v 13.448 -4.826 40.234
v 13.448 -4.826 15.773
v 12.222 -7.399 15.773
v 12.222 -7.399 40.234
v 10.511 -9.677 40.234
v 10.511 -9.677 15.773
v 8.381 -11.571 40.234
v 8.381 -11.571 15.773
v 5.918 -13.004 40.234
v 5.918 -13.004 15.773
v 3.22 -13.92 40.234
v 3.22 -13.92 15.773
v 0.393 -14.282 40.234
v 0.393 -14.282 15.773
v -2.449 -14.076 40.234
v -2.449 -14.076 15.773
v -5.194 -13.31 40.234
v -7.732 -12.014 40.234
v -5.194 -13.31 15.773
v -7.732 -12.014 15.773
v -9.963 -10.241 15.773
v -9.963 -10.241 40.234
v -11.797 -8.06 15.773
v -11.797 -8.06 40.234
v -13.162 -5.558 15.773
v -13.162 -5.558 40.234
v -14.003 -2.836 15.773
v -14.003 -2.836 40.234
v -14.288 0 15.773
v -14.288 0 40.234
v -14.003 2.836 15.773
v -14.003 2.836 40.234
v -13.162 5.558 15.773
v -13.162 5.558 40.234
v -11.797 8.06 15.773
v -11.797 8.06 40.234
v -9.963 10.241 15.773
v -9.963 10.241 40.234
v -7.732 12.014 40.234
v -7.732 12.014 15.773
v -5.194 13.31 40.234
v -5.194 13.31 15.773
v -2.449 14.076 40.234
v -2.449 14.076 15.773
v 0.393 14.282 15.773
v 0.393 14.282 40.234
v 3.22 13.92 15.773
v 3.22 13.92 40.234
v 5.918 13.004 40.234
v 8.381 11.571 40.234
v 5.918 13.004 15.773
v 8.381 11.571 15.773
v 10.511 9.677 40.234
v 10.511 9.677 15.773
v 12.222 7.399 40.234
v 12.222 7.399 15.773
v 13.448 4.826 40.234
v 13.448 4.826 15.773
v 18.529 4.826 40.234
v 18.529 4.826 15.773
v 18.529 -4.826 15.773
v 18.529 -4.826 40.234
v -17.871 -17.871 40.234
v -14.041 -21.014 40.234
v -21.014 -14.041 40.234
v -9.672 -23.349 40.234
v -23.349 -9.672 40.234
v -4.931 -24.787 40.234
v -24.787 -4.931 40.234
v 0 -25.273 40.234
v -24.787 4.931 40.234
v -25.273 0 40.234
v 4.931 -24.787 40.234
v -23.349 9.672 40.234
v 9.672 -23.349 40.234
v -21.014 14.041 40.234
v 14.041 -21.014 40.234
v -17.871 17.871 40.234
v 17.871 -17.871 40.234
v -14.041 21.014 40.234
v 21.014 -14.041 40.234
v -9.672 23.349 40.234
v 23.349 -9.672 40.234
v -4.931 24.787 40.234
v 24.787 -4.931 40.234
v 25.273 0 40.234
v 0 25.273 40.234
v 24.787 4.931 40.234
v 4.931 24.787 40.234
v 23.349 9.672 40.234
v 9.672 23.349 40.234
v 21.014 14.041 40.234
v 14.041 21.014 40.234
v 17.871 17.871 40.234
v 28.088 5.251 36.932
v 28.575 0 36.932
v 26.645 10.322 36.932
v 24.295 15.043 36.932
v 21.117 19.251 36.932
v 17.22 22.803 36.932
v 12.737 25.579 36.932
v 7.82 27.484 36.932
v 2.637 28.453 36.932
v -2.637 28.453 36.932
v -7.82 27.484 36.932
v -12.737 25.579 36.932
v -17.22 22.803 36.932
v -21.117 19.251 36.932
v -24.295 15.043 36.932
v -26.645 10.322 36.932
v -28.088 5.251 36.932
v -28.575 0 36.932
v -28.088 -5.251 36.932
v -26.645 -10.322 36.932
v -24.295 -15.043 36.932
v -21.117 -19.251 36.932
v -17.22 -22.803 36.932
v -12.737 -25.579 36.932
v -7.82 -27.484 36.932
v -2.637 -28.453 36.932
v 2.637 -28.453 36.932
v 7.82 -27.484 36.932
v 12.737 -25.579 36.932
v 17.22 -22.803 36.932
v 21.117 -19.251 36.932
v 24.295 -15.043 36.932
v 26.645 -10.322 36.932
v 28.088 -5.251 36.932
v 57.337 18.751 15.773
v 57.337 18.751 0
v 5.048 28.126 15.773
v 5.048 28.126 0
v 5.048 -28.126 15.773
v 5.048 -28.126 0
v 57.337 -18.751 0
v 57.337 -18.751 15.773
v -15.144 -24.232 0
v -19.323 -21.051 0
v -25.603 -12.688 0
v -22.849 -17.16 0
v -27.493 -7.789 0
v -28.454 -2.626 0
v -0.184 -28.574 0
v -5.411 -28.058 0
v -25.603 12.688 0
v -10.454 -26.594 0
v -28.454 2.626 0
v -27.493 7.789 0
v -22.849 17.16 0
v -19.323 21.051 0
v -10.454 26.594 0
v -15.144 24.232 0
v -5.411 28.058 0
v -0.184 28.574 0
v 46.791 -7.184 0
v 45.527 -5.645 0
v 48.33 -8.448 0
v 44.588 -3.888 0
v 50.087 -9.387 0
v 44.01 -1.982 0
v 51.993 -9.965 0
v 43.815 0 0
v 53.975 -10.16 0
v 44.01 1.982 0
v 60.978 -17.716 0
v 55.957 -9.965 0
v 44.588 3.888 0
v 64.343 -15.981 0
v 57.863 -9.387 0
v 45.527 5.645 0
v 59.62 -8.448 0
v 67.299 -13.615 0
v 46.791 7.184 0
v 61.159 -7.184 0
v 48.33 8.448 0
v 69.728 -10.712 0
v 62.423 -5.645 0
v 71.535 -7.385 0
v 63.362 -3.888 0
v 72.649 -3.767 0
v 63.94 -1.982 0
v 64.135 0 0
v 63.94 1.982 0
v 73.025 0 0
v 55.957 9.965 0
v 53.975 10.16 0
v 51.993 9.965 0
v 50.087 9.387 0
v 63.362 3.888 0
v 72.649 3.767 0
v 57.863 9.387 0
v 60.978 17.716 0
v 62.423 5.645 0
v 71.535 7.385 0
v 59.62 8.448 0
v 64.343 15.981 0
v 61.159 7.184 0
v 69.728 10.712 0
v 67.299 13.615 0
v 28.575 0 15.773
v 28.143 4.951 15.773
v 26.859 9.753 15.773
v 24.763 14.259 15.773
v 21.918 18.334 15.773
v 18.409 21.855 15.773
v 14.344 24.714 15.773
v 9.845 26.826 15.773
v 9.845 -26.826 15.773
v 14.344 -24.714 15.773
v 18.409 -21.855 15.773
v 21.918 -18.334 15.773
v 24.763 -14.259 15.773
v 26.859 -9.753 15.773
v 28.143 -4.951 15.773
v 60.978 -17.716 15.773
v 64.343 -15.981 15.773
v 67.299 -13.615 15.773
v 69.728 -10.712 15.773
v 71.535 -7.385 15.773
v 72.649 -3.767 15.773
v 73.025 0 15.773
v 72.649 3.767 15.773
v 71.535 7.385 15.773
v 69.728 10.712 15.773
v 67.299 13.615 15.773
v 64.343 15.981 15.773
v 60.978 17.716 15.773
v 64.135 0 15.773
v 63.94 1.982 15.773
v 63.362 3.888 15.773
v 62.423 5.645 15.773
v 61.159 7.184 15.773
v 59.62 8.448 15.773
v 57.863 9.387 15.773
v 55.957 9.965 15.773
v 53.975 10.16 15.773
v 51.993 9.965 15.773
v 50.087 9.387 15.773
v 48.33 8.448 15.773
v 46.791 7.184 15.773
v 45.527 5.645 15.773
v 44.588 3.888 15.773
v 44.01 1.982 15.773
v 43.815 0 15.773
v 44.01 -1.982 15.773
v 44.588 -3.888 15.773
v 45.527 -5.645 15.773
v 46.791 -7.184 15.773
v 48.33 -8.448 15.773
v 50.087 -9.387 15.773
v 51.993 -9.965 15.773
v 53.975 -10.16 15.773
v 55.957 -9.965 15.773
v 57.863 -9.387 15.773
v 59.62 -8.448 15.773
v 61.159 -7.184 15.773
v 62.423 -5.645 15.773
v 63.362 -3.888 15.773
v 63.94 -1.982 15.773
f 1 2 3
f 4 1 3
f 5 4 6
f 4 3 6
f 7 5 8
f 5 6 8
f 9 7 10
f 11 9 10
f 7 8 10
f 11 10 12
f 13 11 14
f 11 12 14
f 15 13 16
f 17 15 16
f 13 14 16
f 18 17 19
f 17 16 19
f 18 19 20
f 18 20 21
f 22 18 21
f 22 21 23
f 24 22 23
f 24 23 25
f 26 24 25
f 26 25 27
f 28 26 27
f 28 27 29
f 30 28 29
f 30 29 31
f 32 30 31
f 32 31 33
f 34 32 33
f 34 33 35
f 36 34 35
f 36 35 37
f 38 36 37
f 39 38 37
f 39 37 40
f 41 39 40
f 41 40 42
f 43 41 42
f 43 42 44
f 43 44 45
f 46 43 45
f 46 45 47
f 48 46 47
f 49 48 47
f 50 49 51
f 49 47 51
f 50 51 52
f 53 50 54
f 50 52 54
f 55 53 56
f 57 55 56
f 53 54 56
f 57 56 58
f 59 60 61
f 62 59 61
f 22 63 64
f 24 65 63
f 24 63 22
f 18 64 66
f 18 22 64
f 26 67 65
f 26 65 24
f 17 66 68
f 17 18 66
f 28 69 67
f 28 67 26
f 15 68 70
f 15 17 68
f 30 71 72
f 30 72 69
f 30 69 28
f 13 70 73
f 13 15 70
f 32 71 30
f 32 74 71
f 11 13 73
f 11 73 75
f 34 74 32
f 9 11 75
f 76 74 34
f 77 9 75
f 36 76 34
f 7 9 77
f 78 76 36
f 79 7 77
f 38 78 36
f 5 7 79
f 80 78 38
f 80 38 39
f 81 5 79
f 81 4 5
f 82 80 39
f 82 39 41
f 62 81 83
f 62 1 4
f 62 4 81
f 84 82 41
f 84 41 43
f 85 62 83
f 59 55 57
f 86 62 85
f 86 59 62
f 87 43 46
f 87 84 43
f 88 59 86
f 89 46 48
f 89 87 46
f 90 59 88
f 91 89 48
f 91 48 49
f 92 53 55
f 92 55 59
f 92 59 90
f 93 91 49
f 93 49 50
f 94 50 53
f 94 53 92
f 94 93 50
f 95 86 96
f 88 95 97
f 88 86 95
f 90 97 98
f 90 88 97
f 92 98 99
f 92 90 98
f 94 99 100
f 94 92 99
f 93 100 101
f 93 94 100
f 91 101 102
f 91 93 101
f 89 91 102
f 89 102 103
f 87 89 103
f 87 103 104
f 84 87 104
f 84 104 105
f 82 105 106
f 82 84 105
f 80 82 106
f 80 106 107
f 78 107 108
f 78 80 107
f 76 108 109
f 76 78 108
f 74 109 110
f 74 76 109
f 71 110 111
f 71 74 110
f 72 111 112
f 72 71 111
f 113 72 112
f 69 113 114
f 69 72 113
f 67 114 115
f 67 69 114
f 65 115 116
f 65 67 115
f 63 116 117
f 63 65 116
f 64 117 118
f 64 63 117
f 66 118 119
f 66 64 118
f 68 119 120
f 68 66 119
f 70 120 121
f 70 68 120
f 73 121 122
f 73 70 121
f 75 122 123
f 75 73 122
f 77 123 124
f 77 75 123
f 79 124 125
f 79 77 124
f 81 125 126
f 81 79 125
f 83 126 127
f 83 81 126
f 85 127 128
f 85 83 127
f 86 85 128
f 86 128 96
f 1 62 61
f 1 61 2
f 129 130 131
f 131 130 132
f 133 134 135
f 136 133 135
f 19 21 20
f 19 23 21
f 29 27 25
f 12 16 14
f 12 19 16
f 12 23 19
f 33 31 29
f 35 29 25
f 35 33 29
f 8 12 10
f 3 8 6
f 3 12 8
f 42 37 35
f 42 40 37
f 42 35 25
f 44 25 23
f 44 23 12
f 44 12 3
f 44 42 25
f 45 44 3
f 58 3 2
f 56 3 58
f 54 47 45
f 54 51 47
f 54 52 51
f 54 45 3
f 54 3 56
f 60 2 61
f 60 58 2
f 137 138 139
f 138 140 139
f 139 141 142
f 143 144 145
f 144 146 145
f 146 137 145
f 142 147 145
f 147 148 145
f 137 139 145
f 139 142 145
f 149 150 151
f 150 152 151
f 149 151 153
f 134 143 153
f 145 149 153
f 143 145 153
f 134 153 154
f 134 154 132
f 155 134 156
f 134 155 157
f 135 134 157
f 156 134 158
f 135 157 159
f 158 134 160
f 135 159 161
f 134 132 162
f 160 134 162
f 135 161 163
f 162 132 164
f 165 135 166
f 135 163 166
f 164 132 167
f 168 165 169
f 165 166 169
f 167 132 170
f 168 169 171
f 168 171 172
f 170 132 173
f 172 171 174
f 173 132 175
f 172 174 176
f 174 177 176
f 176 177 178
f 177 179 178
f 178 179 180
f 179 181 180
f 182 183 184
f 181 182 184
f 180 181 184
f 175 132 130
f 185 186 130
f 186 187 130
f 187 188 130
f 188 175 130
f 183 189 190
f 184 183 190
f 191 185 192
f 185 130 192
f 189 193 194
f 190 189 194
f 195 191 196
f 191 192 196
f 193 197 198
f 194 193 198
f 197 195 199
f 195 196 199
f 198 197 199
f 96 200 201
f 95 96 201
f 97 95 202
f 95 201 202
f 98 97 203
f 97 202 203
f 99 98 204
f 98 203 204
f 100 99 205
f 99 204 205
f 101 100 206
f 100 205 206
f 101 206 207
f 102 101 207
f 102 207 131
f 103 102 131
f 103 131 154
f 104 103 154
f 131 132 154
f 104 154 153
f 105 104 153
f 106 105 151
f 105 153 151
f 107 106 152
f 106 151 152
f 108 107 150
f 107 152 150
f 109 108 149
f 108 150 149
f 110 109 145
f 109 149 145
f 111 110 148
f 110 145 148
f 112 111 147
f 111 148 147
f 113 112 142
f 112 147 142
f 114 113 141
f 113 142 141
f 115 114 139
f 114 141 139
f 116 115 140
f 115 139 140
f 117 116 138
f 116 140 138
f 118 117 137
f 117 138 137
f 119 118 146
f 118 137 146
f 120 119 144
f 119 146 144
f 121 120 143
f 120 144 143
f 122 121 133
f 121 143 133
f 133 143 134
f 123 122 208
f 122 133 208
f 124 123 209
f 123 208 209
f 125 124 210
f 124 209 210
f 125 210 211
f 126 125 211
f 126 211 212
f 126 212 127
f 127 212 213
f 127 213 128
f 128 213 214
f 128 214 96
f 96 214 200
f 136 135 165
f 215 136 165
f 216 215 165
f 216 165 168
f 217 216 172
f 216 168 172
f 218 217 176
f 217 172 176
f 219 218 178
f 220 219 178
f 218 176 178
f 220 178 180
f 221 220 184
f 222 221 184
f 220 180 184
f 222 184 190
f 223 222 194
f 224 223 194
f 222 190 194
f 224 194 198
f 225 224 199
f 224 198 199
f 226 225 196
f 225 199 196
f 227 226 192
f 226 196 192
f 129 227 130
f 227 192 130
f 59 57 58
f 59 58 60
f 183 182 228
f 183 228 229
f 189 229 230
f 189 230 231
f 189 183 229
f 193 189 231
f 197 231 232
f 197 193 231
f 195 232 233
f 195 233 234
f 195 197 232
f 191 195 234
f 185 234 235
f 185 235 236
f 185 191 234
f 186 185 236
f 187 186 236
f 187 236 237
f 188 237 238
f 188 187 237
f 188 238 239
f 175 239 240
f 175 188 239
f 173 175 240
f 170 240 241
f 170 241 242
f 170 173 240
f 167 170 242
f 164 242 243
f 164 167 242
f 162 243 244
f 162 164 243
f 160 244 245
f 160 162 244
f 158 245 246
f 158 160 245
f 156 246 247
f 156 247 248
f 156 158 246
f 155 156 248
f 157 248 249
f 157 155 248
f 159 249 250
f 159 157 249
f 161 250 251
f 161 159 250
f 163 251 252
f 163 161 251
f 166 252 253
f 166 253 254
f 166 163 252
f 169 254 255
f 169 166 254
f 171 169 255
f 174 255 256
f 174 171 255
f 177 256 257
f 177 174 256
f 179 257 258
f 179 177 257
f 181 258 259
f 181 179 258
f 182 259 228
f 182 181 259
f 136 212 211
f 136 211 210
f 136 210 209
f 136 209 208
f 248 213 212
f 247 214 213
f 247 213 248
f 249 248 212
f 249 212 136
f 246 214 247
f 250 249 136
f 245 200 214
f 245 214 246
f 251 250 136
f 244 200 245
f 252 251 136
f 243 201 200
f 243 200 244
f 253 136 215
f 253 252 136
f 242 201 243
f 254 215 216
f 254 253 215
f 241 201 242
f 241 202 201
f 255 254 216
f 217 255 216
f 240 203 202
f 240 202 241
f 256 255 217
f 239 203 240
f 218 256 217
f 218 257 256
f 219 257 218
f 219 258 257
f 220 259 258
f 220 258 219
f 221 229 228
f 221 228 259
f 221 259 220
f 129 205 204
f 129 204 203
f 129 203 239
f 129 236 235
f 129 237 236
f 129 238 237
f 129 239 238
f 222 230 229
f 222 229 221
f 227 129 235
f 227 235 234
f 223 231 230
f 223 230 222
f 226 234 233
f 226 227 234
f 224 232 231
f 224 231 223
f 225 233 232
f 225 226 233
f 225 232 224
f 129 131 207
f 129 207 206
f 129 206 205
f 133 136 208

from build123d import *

# Parameters (mm, degrees)
F0_R     = 10.16
F1_DEPTH = 15.7734
F2_R     = 28.575
F3_DEPTH = 40.2336
F4_SIZE  = 3.302


with BuildPart() as f1:
    # F0 (on Top) → F1 (new body)
    with BuildSketch(Plane.XY):
        with BuildLine():
            Line((57.336765, 18.751028), (5.042647, 28.126541))
            ThreePointArc((5.042647, 28.126541), (-28.575, 0), (5.042647, -28.126541))
            Line((5.042647, -28.126541), (57.336765, -18.751028))
            ThreePointArc((57.336765, -18.751028), (73.025, 0), (57.336765, 18.751028))
        make_face()
        with Locations((53.975, 0)):
            Circle(F0_R, mode=Mode.SUBTRACT)
    extrude(amount=F1_DEPTH)

    # F2 (on Top) → F3 (join)
    with BuildSketch(Plane.XY):
        Circle(F2_R)
        with BuildLine():
            ThreePointArc((13.447765, -4.826), (-14.2875, 0), (13.447765, 4.826))
            Line((13.447765, 4.826), (18.5293, 4.826))
            Line((18.5293, 4.826), (18.5293, -4.826))
            Line((18.5293, -4.826), (13.447765, -4.826))
        make_face(mode=Mode.SUBTRACT)
    extrude(amount=F3_DEPTH)

    # F4
    f4_edges = [f1.edges().sort_by_distance(p)[0] for p in [
        (-28.575, 0, 40.2336),
    ]]
    chamfer(f4_edges, length=F4_SIZE)


solid = f1.part
